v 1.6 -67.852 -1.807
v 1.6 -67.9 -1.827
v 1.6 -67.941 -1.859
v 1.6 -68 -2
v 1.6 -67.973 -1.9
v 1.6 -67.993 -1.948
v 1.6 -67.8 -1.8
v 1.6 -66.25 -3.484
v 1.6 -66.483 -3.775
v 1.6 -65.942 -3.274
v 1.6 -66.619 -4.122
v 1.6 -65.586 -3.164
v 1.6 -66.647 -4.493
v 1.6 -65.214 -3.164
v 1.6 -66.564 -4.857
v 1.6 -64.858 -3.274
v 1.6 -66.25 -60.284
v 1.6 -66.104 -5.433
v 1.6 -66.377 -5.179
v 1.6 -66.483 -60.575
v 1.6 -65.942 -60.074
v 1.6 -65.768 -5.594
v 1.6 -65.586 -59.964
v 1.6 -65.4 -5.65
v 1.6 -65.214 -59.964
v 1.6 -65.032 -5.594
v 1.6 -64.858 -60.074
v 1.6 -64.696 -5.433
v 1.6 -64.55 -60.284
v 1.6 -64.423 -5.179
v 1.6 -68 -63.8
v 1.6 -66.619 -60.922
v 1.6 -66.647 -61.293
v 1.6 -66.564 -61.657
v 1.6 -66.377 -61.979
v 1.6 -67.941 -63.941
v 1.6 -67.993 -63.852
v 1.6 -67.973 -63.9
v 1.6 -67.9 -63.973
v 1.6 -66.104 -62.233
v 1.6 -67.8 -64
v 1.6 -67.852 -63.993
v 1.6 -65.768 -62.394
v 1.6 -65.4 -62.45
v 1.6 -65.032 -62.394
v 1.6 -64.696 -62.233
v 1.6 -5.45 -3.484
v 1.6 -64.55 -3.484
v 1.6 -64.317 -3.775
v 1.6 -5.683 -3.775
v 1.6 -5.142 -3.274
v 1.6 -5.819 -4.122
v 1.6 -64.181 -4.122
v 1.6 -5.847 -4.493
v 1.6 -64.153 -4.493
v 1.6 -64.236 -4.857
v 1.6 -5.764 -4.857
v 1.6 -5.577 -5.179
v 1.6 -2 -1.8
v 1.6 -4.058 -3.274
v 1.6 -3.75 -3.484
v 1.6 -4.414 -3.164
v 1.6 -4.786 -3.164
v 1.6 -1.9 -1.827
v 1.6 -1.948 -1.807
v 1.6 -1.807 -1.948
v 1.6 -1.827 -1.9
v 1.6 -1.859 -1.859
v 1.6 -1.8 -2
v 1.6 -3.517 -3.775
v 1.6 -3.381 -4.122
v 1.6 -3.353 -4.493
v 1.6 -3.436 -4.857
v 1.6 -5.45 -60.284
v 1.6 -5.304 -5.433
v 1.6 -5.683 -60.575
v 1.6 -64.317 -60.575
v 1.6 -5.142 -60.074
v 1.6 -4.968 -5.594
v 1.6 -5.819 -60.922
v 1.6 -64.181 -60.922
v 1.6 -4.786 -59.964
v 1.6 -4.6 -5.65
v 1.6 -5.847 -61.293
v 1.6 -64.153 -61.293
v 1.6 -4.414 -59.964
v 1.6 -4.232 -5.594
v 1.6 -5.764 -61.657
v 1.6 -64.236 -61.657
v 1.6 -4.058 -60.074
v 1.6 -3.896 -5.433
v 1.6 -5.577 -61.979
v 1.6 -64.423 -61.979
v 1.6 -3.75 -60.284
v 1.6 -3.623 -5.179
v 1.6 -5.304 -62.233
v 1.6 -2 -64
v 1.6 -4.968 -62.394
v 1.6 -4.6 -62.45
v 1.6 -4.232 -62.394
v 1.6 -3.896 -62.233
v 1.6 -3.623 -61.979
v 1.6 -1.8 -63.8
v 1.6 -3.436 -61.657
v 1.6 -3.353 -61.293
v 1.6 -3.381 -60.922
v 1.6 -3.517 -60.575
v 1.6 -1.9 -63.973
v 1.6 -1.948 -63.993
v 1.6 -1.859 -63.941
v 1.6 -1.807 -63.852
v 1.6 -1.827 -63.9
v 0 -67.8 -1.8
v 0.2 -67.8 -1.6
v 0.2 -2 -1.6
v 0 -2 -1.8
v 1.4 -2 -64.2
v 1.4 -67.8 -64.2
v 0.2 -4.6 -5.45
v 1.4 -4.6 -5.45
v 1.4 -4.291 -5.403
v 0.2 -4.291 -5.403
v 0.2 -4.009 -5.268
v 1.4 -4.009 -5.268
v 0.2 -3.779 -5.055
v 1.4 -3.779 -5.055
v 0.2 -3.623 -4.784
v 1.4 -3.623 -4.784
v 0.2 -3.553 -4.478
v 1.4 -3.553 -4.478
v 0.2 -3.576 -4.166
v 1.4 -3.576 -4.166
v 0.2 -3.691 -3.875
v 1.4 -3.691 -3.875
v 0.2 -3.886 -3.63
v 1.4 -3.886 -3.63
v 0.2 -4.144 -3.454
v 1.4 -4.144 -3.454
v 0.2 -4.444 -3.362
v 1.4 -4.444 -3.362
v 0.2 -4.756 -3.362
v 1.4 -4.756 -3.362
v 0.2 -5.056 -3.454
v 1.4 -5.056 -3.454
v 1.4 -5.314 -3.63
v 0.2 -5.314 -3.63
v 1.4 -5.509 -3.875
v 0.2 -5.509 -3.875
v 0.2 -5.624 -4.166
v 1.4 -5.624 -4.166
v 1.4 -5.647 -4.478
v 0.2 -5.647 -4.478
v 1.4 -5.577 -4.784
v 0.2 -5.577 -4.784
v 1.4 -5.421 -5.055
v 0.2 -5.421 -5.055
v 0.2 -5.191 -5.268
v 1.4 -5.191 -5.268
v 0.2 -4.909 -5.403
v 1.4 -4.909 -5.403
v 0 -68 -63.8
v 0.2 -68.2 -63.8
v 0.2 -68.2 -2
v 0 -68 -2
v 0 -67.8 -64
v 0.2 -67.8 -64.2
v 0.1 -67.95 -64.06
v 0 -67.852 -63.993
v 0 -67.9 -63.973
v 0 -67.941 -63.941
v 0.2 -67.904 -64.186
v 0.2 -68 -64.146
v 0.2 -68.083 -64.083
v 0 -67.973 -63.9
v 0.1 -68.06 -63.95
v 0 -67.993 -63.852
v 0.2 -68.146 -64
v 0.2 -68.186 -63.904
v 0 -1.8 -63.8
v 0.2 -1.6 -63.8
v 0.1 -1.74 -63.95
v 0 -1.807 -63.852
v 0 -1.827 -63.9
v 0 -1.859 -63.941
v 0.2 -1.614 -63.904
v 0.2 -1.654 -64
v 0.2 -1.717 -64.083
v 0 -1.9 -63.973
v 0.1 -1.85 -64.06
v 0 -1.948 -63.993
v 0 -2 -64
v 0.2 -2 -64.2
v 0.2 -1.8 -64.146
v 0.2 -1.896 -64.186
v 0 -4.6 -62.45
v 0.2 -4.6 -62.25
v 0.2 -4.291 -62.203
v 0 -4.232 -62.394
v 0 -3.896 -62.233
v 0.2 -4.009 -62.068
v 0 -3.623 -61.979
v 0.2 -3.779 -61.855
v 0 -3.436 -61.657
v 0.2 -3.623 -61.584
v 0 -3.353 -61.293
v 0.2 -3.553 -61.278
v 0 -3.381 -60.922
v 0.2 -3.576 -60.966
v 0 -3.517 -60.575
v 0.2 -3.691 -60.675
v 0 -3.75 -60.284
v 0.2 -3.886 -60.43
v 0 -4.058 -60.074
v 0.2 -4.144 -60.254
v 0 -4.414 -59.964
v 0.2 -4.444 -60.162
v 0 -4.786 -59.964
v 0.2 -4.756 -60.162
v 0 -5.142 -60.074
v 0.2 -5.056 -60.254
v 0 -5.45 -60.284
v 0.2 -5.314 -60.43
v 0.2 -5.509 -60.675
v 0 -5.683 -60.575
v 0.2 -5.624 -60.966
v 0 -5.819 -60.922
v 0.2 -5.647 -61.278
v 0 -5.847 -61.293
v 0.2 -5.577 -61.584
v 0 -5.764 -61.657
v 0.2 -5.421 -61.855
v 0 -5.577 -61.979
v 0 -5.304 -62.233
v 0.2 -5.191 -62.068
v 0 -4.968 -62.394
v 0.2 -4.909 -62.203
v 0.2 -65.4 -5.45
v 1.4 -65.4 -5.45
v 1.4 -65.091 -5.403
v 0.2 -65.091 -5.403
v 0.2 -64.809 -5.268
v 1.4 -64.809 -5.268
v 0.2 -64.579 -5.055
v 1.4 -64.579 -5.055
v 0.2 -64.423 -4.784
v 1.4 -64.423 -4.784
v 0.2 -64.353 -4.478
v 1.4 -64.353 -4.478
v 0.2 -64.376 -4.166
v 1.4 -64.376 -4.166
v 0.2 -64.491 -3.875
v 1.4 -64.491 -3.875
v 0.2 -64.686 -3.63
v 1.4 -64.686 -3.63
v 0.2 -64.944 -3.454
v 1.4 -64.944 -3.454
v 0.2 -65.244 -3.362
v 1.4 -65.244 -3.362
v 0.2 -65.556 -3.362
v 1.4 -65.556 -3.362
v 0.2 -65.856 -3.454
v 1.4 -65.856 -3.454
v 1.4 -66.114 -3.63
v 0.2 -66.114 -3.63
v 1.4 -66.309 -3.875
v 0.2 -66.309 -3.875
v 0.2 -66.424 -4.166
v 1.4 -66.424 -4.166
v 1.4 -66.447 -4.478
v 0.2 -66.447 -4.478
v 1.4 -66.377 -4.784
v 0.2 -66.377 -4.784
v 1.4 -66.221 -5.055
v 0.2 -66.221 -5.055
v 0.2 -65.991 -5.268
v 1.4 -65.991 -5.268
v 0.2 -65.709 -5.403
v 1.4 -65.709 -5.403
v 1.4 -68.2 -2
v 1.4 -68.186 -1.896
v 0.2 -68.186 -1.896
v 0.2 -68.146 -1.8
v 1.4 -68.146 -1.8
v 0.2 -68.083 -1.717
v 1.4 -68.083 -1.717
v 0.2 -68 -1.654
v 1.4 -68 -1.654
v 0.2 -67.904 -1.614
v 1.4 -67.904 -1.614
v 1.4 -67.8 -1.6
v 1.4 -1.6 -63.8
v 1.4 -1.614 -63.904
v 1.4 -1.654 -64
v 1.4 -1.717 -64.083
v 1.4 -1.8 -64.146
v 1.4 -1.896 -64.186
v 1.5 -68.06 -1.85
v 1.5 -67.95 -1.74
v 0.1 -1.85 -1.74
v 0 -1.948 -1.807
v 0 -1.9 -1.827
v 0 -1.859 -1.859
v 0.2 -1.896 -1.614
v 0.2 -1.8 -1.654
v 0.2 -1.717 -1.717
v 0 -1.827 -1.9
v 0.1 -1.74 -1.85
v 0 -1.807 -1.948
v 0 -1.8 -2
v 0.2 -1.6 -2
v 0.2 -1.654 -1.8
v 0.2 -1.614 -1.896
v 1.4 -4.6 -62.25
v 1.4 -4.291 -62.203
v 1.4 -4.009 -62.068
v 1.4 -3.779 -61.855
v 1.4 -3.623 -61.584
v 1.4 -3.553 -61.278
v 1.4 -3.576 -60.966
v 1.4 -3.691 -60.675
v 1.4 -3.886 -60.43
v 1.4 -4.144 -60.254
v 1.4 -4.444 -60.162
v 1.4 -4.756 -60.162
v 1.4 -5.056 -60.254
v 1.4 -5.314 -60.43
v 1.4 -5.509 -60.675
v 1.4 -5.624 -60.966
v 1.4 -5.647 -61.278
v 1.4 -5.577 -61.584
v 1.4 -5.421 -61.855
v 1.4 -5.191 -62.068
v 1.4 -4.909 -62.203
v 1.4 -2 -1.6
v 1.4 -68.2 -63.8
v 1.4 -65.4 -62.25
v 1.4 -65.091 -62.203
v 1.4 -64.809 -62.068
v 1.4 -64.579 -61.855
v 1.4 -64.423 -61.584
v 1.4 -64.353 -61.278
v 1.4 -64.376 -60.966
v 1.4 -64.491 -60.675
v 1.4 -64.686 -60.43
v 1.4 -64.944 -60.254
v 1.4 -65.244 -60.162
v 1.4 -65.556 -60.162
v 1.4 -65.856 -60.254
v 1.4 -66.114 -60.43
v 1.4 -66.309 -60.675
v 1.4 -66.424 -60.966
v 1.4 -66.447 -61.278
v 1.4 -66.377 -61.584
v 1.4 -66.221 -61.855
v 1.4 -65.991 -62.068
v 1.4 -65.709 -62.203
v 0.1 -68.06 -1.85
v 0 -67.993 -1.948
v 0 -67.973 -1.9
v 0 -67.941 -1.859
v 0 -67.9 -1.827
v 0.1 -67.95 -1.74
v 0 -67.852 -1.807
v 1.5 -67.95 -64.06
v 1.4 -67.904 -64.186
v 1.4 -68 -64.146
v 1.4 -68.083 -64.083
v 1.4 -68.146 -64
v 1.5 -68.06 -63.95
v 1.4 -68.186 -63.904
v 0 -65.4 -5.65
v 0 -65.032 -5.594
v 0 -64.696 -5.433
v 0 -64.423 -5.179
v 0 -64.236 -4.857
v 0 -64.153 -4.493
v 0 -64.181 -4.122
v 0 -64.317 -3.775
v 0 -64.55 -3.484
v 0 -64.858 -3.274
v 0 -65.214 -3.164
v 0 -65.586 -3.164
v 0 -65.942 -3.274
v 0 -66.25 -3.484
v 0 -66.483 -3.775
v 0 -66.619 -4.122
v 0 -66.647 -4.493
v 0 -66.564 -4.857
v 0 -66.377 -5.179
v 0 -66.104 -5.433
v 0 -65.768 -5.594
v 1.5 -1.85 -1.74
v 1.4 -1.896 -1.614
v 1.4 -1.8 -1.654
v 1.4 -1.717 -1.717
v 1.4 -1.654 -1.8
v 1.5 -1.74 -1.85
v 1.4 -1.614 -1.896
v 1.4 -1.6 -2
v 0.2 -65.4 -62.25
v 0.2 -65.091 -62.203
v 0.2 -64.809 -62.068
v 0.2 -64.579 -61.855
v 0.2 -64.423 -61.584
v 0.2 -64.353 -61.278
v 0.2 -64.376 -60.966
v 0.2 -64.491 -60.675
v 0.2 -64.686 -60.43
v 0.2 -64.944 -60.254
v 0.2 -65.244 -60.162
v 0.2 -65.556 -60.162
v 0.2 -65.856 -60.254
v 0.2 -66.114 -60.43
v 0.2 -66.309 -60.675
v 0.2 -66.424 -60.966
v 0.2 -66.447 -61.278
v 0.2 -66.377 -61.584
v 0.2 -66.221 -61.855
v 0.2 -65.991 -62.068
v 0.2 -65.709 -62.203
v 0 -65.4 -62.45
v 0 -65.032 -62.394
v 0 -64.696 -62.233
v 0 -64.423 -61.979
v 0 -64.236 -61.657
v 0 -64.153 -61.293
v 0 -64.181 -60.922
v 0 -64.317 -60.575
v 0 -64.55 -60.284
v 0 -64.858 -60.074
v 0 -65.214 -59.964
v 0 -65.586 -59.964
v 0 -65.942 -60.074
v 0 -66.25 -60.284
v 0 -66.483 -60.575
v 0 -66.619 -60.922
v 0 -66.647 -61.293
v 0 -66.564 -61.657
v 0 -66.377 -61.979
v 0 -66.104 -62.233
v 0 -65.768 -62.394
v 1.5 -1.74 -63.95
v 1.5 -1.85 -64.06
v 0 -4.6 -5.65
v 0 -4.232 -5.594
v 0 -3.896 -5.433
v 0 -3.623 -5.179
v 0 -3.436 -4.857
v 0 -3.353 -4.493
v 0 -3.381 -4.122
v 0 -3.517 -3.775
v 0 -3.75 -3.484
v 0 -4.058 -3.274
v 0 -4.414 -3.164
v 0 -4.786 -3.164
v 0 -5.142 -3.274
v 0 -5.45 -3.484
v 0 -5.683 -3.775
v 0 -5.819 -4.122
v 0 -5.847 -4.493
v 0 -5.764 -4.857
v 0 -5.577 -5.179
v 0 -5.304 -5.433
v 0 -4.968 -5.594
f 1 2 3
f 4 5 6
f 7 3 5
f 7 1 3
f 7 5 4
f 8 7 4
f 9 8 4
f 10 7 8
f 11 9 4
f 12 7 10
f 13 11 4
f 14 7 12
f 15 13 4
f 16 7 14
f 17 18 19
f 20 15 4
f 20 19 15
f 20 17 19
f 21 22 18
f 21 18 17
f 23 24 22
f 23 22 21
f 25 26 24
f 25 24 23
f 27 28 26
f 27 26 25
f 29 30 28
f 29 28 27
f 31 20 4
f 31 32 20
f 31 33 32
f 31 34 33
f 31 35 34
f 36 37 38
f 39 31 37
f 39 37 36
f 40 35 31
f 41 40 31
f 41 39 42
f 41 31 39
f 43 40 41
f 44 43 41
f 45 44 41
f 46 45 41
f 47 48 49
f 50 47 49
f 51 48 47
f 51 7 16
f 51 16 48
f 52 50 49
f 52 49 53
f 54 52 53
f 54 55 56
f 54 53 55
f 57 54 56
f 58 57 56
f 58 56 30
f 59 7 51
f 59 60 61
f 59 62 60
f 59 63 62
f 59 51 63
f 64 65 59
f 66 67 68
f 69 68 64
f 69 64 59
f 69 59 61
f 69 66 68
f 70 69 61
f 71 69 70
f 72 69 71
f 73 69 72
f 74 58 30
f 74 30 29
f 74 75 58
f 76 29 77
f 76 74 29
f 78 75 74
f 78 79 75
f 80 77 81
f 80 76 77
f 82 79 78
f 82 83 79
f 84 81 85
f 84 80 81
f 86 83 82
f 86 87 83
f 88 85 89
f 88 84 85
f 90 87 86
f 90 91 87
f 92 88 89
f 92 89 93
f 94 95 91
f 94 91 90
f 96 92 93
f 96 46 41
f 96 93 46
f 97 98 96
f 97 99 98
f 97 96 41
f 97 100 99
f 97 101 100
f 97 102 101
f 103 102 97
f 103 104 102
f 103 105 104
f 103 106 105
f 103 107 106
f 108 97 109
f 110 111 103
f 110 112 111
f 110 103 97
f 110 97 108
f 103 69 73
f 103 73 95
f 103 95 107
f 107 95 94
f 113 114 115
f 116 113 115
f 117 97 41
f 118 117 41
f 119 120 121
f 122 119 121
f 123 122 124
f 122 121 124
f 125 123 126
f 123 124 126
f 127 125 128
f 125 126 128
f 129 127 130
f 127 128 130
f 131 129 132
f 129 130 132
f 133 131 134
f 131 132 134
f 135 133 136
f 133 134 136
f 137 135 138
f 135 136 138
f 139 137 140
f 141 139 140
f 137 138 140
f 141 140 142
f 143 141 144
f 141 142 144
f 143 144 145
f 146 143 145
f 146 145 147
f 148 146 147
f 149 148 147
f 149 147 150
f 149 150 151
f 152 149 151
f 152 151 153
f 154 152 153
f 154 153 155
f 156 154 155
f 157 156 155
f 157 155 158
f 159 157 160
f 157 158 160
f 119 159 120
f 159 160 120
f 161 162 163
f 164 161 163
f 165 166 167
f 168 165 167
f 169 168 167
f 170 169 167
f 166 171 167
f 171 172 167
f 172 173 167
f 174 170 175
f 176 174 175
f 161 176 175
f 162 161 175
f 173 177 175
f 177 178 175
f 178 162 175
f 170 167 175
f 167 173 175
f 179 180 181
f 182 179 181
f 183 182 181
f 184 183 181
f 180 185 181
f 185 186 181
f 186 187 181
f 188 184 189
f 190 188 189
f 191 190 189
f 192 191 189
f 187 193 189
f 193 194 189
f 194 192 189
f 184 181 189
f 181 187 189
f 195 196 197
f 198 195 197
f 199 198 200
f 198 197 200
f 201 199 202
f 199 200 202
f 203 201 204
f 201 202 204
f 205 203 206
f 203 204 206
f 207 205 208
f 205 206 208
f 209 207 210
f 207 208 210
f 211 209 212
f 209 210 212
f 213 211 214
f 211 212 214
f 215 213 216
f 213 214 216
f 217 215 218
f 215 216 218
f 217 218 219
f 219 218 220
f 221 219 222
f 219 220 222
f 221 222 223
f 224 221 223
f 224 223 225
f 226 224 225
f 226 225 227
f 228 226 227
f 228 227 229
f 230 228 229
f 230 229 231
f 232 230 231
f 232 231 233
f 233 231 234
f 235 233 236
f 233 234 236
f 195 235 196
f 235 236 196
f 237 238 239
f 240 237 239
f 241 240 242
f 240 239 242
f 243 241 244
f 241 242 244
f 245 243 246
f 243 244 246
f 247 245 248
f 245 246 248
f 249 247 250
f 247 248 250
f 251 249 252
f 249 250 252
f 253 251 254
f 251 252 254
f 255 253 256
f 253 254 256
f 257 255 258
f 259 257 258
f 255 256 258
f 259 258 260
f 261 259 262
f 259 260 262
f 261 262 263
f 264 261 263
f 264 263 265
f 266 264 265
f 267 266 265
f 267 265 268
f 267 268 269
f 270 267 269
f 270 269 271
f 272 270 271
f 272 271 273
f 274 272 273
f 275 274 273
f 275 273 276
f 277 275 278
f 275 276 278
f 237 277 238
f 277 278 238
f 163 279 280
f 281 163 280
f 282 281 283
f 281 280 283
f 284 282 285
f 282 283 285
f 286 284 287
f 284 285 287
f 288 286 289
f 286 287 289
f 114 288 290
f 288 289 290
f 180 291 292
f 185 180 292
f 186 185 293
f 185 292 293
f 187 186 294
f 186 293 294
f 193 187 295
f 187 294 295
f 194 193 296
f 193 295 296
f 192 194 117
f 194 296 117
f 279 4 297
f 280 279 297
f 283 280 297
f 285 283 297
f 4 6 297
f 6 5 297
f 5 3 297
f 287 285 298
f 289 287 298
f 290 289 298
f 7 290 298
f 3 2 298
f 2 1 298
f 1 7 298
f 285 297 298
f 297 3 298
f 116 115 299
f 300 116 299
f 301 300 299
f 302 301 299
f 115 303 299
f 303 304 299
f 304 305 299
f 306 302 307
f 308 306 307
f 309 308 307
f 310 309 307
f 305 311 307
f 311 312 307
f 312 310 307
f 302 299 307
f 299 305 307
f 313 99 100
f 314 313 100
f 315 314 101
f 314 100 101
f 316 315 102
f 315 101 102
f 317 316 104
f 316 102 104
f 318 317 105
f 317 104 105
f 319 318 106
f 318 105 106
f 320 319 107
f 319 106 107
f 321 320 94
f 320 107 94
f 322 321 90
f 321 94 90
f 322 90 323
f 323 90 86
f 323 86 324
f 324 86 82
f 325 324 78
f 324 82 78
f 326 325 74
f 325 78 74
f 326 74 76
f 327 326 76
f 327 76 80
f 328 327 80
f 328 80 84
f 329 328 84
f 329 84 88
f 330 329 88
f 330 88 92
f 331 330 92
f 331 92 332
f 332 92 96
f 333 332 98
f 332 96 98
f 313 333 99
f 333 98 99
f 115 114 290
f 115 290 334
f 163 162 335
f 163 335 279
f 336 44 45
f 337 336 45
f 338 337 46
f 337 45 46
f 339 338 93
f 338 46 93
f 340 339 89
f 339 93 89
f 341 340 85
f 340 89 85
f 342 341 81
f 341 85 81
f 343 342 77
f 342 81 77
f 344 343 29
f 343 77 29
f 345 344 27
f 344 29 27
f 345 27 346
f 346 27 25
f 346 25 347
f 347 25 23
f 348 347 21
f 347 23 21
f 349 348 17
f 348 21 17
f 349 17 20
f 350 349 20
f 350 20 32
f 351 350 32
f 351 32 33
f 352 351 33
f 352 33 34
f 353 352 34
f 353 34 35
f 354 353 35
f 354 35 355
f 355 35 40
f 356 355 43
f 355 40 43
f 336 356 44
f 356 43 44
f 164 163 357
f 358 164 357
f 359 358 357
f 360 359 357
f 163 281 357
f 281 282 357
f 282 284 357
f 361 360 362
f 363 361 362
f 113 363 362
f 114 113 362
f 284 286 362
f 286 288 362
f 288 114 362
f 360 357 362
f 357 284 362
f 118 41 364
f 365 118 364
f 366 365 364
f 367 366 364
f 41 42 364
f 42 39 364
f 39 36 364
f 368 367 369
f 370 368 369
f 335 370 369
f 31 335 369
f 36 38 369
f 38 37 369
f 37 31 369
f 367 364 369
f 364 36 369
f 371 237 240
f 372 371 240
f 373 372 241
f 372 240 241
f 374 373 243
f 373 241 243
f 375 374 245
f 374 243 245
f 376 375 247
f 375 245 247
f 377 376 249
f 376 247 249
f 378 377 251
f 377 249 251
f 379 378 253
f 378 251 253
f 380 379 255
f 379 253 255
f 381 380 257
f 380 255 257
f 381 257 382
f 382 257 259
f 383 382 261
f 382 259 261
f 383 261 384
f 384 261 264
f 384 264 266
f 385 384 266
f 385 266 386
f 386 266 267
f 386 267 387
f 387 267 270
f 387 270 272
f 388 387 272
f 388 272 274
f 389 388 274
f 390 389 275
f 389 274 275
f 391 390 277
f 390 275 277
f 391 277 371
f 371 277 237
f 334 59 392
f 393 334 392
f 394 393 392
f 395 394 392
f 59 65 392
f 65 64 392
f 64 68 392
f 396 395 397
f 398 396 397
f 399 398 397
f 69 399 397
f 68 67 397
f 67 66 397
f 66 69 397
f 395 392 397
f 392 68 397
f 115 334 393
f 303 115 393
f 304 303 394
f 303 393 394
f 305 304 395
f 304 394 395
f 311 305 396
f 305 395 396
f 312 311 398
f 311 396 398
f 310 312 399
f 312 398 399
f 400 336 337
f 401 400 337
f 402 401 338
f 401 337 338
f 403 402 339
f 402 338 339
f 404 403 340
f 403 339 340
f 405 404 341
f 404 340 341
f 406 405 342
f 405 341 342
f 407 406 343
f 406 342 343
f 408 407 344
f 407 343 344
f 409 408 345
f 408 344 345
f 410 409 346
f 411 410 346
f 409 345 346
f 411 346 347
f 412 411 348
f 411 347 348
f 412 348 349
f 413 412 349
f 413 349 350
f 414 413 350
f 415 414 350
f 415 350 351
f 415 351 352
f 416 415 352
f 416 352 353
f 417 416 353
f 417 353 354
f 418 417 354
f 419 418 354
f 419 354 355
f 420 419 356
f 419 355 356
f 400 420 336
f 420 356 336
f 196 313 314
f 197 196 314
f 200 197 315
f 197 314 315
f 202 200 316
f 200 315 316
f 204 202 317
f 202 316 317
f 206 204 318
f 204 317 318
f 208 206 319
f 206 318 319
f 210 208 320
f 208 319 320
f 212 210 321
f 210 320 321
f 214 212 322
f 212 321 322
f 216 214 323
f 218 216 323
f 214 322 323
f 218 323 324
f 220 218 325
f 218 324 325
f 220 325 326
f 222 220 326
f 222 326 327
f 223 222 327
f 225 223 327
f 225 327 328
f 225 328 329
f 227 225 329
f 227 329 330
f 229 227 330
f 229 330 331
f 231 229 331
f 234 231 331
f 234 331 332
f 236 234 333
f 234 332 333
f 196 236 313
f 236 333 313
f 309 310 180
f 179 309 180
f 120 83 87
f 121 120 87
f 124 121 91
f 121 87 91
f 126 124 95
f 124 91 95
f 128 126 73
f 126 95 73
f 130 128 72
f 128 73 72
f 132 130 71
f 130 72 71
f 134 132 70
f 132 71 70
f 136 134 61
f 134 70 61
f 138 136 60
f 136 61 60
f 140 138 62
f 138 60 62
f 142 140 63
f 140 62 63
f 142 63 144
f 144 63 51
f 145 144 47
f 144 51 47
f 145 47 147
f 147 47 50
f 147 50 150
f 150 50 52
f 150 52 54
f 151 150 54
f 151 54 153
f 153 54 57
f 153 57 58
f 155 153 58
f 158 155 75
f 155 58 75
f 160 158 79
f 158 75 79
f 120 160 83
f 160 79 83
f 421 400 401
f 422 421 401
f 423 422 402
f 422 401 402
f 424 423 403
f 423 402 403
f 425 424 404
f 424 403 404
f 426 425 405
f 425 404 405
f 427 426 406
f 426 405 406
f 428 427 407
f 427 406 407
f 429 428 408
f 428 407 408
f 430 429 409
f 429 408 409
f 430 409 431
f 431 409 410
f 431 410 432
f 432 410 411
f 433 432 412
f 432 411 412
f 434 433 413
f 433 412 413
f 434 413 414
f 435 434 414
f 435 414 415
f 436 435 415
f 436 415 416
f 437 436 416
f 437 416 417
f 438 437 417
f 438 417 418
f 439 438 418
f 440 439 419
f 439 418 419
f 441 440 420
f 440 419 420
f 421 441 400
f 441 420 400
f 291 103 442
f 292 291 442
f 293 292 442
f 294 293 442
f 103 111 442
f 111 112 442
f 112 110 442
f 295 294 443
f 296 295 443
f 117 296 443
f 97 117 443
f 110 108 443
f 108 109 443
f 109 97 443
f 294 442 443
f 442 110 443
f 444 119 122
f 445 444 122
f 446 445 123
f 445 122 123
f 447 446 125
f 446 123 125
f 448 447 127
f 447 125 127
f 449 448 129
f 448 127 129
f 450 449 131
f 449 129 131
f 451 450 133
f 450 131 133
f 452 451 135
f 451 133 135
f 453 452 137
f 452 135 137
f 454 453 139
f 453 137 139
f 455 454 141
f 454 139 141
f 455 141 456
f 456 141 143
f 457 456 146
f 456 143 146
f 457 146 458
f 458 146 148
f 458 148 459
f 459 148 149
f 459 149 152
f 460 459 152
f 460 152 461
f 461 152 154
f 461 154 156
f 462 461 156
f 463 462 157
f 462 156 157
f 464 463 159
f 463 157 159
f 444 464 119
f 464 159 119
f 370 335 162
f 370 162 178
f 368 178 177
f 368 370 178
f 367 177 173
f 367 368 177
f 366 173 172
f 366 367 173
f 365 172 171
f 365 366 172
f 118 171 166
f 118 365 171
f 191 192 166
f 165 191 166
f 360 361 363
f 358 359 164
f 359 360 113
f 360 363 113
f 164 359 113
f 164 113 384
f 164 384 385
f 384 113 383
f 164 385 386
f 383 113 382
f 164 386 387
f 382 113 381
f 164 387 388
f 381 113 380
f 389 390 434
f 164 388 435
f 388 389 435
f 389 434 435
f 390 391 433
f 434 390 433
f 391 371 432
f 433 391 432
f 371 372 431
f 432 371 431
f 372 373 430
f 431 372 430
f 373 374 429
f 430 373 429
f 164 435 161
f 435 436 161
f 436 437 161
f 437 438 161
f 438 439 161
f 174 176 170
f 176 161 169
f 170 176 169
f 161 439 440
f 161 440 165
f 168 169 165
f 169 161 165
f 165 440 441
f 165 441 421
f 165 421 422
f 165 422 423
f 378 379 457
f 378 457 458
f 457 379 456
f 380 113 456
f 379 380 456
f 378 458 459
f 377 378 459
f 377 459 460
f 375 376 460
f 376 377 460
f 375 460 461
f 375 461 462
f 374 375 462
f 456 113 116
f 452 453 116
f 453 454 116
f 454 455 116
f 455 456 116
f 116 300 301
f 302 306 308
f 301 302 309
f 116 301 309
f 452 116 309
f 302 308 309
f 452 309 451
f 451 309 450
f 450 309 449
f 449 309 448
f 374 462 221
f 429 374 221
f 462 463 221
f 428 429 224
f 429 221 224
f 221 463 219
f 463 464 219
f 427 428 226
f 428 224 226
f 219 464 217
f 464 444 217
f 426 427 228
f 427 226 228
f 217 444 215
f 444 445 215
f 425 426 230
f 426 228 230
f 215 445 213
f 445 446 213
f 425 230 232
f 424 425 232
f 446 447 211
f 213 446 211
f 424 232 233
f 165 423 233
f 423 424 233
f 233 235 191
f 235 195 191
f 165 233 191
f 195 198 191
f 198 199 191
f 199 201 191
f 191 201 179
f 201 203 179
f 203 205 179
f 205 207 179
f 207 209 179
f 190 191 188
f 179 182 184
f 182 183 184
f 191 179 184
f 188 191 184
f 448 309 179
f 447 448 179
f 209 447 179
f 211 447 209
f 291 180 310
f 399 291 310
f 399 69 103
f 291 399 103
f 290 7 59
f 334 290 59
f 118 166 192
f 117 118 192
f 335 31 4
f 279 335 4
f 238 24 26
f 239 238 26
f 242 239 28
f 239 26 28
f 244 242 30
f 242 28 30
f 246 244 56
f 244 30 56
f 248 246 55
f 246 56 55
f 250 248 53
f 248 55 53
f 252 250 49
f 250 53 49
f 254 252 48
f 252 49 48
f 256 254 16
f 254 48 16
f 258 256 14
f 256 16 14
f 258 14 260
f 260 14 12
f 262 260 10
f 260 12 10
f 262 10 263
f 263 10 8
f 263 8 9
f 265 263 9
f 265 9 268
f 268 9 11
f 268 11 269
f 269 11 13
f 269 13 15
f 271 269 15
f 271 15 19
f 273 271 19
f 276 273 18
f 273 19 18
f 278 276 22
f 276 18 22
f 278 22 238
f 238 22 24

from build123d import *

# Parameters (mm, degrees)
SKETCH_1_W          = 65.8
SKETCH_1_H          = 69.8
EXTRUDE_1_DEPTH     = 1.6
SKETCH_2_R          = 1.05
CUT_EXTRUDE_1_DEPTH = 1.6
SKETCH_5_W          = 65.8
SKETCH_5_H          = 69.8
SKETCH_5_W_2        = 62.6
SKETCH_5_H_2        = 66.6
CUT_EXTRUDE_2_DEPTH = 1.6
FILLET_2_R          = 0.4
CHAMFER_1_SIZE      = 0.2


with BuildPart() as part:
    # 草图1 → 凸台-拉伸1 (new body)
    with BuildSketch(Plane(origin=(0, 0, 0), x_dir=(0, 0, -1), z_dir=(1, 0, 0))):
        with Locations((32.9, -34.9)):
            Rectangle(SKETCH_1_W, SKETCH_1_H)
    extrude(amount=EXTRUDE_1_DEPTH)

    # 草图2 → 切除-拉伸1 (cut)
    with BuildSketch(Plane(origin=(1.6, 0, 0), x_dir=(0, 0, -1), z_dir=(1, 0, 0))):
        with Locations((61.2, -4.6)):
            Circle(SKETCH_2_R)
        with Locations((4.4, -4.6)):
            Circle(SKETCH_2_R)
        with Locations((4.4, -65.4)):
            Circle(SKETCH_2_R)
        with Locations((61.2, -65.4)):
            Circle(SKETCH_2_R)
    extrude(amount=-CUT_EXTRUDE_1_DEPTH, mode=Mode.SUBTRACT)

    # 草图5 → 切除-拉伸2 (cut)
    with BuildSketch(Plane.ZY):
        with Locations((-32.9, -34.9)):
            Rectangle(SKETCH_5_W, SKETCH_5_H)
        with Locations((-32.9, -34.9)):
            Rectangle(SKETCH_5_W_2, SKETCH_5_H_2, mode=Mode.SUBTRACT)
    extrude(amount=-CUT_EXTRUDE_2_DEPTH, mode=Mode.SUBTRACT)

    # 圆角2
    fillet_2_edges = [part.edges().sort_by_distance(p)[0] for p in [
        (0.8, -1.6, -1.6),
        (0.8, -68.2, -1.6),
        (0.8, -68.2, -64.2),
        (0.8, -1.6, -64.2),
    ]]
    fillet(fillet_2_edges, radius=FILLET_2_R)

    # 倒角1
    chamfer_1_edges = [part.edges().sort_by_distance(p)[0] for p in [
        (0, -65.4, -60.15),
        (1.6, -65.4, -60.15),
        (0, -65.4, -3.35),
        (1.6, -65.4, -3.35),
        (0, -4.6, -3.35),
        (1.6, -4.6, -3.35),
        (0, -4.6, -60.15),
        (1.6, -4.6, -60.15),
        (0, -34.9, -1.6),
        (1.6, -34.9, -1.6),
        (0, -1.6, -32.9),
        (0, -34.9, -64.2),
        (0, -68.2, -32.9),
        (0, -1.717157288, -64.082842712),
        (0, -68.082842712, -64.082842712),
        (0, -68.082842712, -1.717157288),
        (0, -1.717157288, -1.717157288),
        (1.6, -1.6, -32.9),
        (1.6, -34.9, -64.2),
        (1.6, -68.2, -32.9),
        (1.6, -1.717157288, -64.082842712),
        (1.6, -68.082842712, -64.082842712),
        (1.6, -68.082842712, -1.717157288),
        (1.6, -1.717157288, -1.717157288),
    ]]
    chamfer(chamfer_1_edges, length=CHAMFER_1_SIZE)


solid = part.part
